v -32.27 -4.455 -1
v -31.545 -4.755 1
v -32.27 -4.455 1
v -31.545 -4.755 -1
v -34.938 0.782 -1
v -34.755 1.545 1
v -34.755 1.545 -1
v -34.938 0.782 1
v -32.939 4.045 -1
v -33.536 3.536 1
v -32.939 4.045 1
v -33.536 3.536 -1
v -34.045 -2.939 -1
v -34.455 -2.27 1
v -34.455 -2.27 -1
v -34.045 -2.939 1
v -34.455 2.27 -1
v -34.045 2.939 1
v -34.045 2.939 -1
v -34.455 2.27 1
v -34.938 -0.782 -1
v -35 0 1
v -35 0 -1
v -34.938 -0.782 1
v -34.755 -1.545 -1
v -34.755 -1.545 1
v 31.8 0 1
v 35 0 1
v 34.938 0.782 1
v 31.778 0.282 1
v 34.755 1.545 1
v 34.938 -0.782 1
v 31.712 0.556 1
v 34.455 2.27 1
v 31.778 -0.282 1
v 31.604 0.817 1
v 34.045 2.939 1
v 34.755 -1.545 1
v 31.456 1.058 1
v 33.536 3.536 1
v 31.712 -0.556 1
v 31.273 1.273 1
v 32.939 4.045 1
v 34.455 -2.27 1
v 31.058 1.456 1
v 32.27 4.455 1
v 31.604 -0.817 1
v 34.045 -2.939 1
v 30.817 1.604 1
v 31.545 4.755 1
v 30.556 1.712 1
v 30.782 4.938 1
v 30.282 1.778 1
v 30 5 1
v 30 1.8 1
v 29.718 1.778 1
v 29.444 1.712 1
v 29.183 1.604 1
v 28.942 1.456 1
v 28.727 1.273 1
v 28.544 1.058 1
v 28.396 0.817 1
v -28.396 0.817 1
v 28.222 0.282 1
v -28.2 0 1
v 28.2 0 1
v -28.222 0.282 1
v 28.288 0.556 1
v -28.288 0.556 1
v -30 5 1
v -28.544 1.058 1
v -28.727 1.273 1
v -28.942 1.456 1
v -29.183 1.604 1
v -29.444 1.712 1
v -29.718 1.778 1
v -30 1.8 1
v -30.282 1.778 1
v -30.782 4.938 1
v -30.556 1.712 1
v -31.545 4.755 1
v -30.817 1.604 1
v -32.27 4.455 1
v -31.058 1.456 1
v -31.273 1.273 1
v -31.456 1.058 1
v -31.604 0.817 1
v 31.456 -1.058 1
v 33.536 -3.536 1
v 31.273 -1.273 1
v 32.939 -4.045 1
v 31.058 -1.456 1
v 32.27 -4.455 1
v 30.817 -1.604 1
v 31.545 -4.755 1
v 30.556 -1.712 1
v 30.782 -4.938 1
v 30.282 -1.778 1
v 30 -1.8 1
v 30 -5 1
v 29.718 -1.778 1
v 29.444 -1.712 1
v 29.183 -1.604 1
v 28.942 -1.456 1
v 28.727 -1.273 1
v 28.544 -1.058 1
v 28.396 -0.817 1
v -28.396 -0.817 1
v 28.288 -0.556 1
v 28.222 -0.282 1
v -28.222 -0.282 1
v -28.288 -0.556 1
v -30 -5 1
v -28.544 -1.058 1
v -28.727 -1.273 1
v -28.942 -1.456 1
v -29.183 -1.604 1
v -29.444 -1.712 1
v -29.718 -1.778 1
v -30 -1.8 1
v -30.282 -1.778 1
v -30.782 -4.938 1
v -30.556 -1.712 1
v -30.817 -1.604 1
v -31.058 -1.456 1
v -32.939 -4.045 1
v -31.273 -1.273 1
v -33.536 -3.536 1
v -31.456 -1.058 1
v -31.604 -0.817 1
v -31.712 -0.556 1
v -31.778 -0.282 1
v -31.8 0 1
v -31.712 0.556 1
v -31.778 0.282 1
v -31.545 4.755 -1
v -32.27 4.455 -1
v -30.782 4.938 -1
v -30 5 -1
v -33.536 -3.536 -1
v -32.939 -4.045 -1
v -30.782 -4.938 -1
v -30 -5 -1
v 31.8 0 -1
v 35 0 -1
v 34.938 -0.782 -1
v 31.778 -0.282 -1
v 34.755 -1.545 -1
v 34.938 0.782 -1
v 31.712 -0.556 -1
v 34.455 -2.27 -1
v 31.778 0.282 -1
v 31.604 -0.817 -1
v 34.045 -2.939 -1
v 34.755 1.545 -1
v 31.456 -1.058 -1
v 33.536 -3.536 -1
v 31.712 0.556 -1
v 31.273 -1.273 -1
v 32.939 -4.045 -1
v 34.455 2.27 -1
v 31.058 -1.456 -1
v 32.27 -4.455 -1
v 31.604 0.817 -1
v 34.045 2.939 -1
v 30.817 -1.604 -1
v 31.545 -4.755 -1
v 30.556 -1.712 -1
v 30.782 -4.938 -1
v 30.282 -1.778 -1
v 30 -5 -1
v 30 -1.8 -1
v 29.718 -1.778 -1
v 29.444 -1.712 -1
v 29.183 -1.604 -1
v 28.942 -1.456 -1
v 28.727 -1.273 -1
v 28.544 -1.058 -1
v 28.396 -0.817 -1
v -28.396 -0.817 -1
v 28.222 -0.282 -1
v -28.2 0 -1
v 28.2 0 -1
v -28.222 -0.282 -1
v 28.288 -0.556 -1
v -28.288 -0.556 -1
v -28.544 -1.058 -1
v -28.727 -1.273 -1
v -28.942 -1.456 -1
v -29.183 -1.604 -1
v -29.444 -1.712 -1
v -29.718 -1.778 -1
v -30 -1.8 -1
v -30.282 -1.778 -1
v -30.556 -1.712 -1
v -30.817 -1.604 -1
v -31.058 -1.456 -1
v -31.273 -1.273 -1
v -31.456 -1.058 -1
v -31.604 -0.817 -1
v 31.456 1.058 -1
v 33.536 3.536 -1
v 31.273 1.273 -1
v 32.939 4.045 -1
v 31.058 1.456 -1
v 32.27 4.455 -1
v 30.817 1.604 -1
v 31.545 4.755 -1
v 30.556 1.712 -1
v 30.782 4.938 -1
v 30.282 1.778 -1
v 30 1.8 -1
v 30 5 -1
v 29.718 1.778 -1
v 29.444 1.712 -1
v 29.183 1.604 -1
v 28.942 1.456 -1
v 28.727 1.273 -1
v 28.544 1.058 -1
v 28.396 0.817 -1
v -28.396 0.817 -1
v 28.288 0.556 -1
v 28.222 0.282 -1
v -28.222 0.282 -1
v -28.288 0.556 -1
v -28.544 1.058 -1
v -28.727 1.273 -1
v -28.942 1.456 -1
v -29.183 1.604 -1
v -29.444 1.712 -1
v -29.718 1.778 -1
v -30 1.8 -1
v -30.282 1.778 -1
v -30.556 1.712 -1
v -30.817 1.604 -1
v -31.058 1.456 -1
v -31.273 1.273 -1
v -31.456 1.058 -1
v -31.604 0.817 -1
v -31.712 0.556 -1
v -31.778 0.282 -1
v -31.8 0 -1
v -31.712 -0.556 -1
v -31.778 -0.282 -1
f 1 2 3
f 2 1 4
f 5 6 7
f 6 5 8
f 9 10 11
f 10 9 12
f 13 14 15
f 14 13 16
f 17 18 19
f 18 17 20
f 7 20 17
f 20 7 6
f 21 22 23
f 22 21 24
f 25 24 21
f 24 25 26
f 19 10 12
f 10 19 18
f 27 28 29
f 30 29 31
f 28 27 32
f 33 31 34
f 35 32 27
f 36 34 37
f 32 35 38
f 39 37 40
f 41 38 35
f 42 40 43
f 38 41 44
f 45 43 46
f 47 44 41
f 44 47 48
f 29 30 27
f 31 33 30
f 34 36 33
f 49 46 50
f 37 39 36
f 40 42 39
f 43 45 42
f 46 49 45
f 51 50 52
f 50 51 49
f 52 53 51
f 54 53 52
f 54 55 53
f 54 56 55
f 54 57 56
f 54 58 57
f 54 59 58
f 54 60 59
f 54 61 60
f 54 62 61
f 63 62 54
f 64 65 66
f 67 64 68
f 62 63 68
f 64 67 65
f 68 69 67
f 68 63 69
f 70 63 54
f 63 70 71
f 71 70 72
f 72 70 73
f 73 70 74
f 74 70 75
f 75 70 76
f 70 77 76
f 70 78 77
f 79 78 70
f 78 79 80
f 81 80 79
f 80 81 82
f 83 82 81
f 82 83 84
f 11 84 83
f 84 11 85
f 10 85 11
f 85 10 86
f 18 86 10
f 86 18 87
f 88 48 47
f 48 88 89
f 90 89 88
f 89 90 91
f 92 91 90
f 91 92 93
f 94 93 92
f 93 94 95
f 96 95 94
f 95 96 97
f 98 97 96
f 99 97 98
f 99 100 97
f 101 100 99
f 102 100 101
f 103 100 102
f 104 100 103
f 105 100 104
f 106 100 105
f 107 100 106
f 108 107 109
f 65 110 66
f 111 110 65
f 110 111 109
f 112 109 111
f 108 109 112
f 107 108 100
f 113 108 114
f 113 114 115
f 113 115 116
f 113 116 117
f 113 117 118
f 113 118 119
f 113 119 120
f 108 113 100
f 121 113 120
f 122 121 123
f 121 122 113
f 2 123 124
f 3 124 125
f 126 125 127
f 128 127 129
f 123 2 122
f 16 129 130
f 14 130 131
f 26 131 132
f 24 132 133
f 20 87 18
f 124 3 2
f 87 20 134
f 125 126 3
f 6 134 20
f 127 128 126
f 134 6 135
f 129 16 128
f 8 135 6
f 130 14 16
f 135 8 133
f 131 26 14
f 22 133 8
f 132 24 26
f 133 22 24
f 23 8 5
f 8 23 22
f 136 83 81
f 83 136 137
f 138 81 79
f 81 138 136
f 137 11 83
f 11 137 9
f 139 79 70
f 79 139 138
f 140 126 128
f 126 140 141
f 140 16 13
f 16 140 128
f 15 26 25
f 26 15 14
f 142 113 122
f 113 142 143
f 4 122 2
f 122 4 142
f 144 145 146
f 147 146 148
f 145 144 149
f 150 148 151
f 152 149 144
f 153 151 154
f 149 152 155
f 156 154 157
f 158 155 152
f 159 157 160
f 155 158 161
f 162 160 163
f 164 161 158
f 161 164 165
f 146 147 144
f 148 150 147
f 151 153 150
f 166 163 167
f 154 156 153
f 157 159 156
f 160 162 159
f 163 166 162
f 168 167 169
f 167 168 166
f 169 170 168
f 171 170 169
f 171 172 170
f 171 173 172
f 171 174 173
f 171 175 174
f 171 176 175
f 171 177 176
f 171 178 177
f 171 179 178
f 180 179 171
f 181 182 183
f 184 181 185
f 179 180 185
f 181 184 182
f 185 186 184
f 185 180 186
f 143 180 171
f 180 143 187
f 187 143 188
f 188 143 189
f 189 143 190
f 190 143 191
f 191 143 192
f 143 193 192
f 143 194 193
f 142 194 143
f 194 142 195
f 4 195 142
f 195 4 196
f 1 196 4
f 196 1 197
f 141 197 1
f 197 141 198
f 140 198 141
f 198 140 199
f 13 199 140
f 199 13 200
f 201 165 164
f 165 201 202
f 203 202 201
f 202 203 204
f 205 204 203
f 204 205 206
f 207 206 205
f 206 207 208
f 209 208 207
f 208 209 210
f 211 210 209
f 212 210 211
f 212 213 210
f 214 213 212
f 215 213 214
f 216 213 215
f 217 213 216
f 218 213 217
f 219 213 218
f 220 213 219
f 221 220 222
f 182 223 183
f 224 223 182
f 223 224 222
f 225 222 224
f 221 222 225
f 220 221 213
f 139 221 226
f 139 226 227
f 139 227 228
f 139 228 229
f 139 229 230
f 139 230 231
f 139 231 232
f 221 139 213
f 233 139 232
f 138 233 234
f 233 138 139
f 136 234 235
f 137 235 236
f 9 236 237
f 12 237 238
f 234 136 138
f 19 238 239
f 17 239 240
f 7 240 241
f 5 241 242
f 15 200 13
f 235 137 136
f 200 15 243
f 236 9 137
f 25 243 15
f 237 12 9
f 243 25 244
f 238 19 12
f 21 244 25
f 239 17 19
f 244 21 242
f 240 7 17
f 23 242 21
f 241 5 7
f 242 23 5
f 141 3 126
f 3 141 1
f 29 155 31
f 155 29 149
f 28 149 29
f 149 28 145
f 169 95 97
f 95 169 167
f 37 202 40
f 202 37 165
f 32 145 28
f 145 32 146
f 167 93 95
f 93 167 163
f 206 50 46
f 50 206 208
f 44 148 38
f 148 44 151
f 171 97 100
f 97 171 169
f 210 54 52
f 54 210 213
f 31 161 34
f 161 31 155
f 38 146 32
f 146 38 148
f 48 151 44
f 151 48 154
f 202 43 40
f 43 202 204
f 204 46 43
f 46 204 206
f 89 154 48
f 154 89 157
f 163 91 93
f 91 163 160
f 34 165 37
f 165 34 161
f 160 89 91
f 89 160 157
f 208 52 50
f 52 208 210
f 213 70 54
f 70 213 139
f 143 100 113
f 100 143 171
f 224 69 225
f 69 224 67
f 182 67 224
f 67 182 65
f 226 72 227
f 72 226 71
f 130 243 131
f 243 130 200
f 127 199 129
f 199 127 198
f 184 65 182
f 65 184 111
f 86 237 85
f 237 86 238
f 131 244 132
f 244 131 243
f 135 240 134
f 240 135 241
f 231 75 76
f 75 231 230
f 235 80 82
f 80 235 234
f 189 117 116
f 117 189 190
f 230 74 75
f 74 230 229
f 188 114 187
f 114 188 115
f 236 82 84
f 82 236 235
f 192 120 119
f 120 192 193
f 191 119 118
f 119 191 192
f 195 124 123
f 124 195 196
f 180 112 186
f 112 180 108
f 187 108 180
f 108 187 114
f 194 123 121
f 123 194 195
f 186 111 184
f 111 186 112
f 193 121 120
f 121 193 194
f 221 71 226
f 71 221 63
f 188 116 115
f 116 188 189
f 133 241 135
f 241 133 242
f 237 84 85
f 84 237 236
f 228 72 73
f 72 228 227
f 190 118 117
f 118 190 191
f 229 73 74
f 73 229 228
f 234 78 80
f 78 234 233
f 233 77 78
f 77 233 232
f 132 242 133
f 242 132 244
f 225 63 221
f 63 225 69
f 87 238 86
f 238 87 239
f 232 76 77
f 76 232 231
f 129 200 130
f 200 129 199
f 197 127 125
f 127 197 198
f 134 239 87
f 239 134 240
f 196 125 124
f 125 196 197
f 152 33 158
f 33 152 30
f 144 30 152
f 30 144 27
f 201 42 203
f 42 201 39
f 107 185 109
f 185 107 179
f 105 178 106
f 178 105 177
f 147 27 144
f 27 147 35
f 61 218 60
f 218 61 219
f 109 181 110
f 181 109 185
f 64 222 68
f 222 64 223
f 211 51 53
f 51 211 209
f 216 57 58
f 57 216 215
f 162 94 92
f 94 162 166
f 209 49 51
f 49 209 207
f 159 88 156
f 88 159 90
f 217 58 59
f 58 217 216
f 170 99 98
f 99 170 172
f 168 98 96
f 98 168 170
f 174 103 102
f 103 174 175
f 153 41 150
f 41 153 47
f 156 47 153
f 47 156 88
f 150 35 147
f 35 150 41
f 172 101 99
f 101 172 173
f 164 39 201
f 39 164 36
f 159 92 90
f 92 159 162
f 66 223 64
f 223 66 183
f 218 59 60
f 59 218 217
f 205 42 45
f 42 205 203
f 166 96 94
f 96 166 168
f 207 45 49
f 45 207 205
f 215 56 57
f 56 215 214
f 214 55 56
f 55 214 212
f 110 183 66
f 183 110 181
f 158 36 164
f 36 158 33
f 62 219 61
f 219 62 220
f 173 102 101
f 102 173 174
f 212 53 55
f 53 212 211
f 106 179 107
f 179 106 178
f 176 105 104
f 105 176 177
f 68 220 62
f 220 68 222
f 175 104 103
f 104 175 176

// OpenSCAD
$fn = 40;

module attacher(length, width=10, wall=2, hole_d=3.6) {
  difference() {
    union() {
      cube([length, width, wall], center=true);
      for(i=[-1,1]) {
        translate([i*length/2, 0, 0]) {
          cylinder(d=width, h=wall, center=true);
        }
      }
    }
    for(i=[-1,1]) {
      translate([i*length/2, 0, 0]) {
        cylinder(d=hole_d, h=wall, center=true);
      }
    }
  }
}

attacher(60);
